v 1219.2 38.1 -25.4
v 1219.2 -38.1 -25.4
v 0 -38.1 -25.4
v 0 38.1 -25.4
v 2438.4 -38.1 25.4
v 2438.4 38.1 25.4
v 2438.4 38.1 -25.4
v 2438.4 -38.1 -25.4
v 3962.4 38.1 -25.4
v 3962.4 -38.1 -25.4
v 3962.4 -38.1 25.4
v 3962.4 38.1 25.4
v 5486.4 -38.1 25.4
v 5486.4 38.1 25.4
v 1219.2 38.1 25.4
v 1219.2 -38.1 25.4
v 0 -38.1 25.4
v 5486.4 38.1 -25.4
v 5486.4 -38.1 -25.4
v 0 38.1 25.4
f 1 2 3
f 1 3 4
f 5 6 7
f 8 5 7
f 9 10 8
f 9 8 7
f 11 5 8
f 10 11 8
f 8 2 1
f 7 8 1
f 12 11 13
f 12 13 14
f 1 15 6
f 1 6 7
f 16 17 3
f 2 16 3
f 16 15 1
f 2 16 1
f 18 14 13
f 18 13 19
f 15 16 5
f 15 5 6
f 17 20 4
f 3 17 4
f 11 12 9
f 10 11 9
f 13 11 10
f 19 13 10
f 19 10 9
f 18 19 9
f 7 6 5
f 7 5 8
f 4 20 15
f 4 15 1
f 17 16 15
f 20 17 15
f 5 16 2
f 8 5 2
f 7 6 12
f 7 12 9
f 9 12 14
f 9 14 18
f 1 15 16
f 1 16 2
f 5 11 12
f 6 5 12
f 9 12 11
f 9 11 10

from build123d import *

# Parameters (mm, degrees)
SKETCH2_W           = 50.8
SKETCH2_H           = 76.2
BOSS_EXTRUDE1_DEPTH = 1219.2
BOSS_EXTRUDE5_START = 1219.2
SKETCH2_8_W         = 50.8
SKETCH2_8_H         = 76.2
BOSS_EXTRUDE5_DEPTH = 1219.2
BOSS_EXTRUDE6_START = 2438.4
SKETCH2_9_W         = 50.8
SKETCH2_9_H         = 76.2
BOSS_EXTRUDE6_DEPTH = 1524
BOSS_EXTRUDE7_START = 3962.4
SKETCH2_10_W        = 50.8
SKETCH2_10_H        = 76.2
BOSS_EXTRUDE7_DEPTH = 1524


with BuildPart() as part:
    # Sketch2 → Boss-Extrude1 (new body)
    with BuildSketch(Plane(origin=(0, 0, 0), x_dir=(0, 0, -1), z_dir=(1, 0, 0))):
        Rectangle(SKETCH2_W, SKETCH2_H)
    extrude(amount=BOSS_EXTRUDE1_DEPTH)


with BuildPart() as body_2:
    # Sketch2<8> → Boss-Extrude5 (new body)
    with BuildSketch(Plane(origin=(0, 0, 0), x_dir=(0, 0, -1), z_dir=(1, 0, 0)).offset(BOSS_EXTRUDE5_START)):
        Rectangle(SKETCH2_8_W, SKETCH2_8_H)
    extrude(amount=BOSS_EXTRUDE5_DEPTH)


with BuildPart() as body_3:
    # Sketch2<9> → Boss-Extrude6 (new body)
    with BuildSketch(Plane(origin=(0, 0, 0), x_dir=(0, 0, -1), z_dir=(1, 0, 0)).offset(BOSS_EXTRUDE6_START)):
        Rectangle(SKETCH2_9_W, SKETCH2_9_H)
    extrude(amount=BOSS_EXTRUDE6_DEPTH)


with BuildPart() as body_4:
    # Sketch2<10> → Boss-Extrude7 (new body)
    with BuildSketch(Plane(origin=(0, 0, 0), x_dir=(0, 0, -1), z_dir=(1, 0, 0)).offset(BOSS_EXTRUDE7_START)):
        Rectangle(SKETCH2_10_W, SKETCH2_10_H)
    extrude(amount=BOSS_EXTRUDE7_DEPTH)


solid = Compound([part.part, body_2.part, body_3.part, body_4.part])
